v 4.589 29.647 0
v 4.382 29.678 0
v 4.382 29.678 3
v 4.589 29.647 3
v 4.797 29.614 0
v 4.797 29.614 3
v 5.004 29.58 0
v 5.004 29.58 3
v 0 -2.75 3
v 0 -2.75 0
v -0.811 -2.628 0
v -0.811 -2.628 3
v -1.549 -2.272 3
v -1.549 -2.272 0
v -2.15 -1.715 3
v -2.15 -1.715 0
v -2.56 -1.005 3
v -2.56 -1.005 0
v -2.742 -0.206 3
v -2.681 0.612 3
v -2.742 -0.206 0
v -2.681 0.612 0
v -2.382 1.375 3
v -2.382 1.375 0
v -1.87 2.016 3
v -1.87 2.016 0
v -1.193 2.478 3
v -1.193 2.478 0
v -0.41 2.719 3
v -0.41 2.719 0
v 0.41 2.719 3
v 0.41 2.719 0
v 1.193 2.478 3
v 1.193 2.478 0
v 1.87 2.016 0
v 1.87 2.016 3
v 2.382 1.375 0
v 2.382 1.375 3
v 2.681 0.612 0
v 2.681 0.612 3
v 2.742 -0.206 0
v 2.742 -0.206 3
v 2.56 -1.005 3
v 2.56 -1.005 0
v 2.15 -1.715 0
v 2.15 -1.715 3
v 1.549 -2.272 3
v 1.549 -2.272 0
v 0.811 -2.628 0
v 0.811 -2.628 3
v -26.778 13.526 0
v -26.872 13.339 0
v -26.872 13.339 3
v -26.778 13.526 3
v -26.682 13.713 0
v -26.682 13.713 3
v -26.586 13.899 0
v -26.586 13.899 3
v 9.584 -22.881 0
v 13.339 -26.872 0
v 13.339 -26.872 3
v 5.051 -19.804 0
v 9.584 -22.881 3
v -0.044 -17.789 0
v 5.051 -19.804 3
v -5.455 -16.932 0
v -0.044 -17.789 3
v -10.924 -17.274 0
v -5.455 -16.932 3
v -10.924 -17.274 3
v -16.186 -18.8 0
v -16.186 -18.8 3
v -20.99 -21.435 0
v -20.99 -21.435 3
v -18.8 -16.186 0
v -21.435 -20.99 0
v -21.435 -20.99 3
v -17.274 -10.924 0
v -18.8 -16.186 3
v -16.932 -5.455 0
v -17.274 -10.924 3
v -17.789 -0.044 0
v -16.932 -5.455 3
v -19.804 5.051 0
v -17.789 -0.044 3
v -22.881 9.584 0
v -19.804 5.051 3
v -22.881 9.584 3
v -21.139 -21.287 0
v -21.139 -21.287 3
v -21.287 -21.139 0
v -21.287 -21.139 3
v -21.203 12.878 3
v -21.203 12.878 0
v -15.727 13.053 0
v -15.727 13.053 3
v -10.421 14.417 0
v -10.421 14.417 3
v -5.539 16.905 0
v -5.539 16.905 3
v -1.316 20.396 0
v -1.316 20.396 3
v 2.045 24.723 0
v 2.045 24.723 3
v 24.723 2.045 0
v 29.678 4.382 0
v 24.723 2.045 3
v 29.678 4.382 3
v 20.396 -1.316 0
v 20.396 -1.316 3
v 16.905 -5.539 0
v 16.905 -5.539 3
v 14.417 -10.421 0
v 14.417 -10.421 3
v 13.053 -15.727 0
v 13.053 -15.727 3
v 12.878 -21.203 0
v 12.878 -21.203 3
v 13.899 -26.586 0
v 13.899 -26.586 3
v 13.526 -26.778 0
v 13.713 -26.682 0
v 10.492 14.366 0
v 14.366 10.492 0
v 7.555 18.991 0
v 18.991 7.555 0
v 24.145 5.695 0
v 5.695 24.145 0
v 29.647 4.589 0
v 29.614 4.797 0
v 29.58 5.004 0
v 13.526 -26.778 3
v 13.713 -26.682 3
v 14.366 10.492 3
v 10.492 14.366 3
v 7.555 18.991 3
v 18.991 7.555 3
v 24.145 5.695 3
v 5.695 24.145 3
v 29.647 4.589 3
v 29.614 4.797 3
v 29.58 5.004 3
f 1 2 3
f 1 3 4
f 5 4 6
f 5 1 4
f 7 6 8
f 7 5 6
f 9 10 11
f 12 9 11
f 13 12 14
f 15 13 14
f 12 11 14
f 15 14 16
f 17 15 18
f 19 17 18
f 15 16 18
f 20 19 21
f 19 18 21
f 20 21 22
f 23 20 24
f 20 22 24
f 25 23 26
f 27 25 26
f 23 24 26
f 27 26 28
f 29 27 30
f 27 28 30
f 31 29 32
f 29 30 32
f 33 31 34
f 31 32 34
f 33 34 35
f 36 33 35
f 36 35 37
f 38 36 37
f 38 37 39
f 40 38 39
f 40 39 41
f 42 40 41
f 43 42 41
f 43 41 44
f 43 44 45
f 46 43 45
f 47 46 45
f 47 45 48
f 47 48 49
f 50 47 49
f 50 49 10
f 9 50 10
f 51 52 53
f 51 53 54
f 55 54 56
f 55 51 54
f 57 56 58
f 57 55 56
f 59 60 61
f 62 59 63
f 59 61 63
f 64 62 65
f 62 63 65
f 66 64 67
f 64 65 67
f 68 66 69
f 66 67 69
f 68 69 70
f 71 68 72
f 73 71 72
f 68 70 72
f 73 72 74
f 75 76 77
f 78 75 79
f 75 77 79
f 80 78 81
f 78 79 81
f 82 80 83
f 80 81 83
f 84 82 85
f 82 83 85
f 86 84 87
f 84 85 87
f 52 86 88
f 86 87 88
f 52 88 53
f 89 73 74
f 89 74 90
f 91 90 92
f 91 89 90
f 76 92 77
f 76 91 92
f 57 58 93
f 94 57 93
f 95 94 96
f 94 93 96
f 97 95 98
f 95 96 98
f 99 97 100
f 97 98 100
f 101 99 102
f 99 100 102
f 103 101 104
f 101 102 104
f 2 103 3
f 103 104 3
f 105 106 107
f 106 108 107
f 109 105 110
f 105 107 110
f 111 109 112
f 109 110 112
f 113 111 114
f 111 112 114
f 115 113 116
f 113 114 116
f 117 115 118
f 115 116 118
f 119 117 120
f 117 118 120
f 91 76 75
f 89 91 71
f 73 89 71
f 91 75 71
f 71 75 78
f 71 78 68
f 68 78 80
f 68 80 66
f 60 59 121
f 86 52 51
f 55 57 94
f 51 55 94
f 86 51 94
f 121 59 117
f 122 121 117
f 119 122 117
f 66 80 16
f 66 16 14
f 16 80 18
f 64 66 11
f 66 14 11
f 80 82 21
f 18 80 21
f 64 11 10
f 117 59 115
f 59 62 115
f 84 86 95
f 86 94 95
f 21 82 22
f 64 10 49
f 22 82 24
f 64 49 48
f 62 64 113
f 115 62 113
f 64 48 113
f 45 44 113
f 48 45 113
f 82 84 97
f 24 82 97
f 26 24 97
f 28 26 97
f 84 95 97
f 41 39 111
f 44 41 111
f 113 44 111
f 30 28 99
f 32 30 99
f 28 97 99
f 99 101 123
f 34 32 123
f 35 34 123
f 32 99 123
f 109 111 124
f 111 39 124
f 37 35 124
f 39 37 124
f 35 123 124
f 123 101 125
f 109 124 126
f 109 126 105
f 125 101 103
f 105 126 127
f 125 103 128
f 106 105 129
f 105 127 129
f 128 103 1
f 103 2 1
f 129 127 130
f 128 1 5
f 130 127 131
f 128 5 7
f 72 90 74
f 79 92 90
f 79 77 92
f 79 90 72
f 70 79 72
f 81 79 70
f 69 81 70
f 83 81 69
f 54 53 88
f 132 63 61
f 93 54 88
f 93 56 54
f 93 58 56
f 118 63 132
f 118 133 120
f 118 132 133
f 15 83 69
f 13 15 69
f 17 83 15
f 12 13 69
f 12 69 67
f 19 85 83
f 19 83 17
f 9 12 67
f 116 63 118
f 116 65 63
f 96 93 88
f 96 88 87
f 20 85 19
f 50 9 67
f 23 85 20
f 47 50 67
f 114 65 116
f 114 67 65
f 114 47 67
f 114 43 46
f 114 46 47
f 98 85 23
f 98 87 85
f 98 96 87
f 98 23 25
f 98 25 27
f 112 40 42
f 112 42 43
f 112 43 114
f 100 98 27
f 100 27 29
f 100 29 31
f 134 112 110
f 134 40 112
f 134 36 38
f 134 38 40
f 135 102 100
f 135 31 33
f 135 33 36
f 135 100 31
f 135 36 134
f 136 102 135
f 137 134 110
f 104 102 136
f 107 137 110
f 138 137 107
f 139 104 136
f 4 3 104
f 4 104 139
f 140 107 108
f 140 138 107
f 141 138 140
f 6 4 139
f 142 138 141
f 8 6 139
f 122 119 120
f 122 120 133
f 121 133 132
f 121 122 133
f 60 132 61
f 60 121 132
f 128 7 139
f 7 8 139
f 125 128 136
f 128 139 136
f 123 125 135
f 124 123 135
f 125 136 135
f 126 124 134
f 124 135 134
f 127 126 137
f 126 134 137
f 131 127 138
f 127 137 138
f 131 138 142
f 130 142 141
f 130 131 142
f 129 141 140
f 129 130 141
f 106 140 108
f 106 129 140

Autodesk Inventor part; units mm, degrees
ref_plane "YZ Plane" through (0, 0, 0) normal (1, 0, 0) x (0, 1, 0)
ref_plane "XZ Plane" through (0, 0, 0) normal (0, 1, 0) x (-1, 0, 0)
ref_plane "XY Plane" through (0, 0, 0) normal (0, 0, 1) x (1, 0, 0)
sketch "Sketch1" plane through (0, 0, 0) normal (0, 0, 1) x (1, 0, 0)
  circle A0 centre (0, 0) radius 30
  dimension "d0" = 60
extrude "Extrusion1" add sketch "Sketch1" along normal blind 3
sketch "Sketch2" plane through (0, 0, 3) normal (0, 0, 1) x (1, 0, 0)
  circle A0 centre (0, 0) radius 30 projected
  circle A1 centre (30, 30) radius 25
  dimension "d6" = 50
  dimension "d7" = 30
  dimension "d8" = 30
extrude "Extrusion2" cut sketch "Sketch2" against normal through all contours A1 A0 | A0 A1 picked at (18.8229, 17.5315) picked at (30.2504, 29.5845)
pattern_circular "Circular Pattern1" count 5 over 360 about axis through (0, 0, -10) along (0, 0, 1) of "Extrusion2"
sketch "Sketch3" plane through (0, 0, 3) normal (0, 0, 1) x (1, 0, 0)
  point P0 (0, 0)
  point P1 (0, 0)
hole "Hole1" at (0, 0, 3) direction (0, 0, -1) diameter 5.5 end through all
equation "\"d8\" = d7"
properties part number "Timing_Star"
